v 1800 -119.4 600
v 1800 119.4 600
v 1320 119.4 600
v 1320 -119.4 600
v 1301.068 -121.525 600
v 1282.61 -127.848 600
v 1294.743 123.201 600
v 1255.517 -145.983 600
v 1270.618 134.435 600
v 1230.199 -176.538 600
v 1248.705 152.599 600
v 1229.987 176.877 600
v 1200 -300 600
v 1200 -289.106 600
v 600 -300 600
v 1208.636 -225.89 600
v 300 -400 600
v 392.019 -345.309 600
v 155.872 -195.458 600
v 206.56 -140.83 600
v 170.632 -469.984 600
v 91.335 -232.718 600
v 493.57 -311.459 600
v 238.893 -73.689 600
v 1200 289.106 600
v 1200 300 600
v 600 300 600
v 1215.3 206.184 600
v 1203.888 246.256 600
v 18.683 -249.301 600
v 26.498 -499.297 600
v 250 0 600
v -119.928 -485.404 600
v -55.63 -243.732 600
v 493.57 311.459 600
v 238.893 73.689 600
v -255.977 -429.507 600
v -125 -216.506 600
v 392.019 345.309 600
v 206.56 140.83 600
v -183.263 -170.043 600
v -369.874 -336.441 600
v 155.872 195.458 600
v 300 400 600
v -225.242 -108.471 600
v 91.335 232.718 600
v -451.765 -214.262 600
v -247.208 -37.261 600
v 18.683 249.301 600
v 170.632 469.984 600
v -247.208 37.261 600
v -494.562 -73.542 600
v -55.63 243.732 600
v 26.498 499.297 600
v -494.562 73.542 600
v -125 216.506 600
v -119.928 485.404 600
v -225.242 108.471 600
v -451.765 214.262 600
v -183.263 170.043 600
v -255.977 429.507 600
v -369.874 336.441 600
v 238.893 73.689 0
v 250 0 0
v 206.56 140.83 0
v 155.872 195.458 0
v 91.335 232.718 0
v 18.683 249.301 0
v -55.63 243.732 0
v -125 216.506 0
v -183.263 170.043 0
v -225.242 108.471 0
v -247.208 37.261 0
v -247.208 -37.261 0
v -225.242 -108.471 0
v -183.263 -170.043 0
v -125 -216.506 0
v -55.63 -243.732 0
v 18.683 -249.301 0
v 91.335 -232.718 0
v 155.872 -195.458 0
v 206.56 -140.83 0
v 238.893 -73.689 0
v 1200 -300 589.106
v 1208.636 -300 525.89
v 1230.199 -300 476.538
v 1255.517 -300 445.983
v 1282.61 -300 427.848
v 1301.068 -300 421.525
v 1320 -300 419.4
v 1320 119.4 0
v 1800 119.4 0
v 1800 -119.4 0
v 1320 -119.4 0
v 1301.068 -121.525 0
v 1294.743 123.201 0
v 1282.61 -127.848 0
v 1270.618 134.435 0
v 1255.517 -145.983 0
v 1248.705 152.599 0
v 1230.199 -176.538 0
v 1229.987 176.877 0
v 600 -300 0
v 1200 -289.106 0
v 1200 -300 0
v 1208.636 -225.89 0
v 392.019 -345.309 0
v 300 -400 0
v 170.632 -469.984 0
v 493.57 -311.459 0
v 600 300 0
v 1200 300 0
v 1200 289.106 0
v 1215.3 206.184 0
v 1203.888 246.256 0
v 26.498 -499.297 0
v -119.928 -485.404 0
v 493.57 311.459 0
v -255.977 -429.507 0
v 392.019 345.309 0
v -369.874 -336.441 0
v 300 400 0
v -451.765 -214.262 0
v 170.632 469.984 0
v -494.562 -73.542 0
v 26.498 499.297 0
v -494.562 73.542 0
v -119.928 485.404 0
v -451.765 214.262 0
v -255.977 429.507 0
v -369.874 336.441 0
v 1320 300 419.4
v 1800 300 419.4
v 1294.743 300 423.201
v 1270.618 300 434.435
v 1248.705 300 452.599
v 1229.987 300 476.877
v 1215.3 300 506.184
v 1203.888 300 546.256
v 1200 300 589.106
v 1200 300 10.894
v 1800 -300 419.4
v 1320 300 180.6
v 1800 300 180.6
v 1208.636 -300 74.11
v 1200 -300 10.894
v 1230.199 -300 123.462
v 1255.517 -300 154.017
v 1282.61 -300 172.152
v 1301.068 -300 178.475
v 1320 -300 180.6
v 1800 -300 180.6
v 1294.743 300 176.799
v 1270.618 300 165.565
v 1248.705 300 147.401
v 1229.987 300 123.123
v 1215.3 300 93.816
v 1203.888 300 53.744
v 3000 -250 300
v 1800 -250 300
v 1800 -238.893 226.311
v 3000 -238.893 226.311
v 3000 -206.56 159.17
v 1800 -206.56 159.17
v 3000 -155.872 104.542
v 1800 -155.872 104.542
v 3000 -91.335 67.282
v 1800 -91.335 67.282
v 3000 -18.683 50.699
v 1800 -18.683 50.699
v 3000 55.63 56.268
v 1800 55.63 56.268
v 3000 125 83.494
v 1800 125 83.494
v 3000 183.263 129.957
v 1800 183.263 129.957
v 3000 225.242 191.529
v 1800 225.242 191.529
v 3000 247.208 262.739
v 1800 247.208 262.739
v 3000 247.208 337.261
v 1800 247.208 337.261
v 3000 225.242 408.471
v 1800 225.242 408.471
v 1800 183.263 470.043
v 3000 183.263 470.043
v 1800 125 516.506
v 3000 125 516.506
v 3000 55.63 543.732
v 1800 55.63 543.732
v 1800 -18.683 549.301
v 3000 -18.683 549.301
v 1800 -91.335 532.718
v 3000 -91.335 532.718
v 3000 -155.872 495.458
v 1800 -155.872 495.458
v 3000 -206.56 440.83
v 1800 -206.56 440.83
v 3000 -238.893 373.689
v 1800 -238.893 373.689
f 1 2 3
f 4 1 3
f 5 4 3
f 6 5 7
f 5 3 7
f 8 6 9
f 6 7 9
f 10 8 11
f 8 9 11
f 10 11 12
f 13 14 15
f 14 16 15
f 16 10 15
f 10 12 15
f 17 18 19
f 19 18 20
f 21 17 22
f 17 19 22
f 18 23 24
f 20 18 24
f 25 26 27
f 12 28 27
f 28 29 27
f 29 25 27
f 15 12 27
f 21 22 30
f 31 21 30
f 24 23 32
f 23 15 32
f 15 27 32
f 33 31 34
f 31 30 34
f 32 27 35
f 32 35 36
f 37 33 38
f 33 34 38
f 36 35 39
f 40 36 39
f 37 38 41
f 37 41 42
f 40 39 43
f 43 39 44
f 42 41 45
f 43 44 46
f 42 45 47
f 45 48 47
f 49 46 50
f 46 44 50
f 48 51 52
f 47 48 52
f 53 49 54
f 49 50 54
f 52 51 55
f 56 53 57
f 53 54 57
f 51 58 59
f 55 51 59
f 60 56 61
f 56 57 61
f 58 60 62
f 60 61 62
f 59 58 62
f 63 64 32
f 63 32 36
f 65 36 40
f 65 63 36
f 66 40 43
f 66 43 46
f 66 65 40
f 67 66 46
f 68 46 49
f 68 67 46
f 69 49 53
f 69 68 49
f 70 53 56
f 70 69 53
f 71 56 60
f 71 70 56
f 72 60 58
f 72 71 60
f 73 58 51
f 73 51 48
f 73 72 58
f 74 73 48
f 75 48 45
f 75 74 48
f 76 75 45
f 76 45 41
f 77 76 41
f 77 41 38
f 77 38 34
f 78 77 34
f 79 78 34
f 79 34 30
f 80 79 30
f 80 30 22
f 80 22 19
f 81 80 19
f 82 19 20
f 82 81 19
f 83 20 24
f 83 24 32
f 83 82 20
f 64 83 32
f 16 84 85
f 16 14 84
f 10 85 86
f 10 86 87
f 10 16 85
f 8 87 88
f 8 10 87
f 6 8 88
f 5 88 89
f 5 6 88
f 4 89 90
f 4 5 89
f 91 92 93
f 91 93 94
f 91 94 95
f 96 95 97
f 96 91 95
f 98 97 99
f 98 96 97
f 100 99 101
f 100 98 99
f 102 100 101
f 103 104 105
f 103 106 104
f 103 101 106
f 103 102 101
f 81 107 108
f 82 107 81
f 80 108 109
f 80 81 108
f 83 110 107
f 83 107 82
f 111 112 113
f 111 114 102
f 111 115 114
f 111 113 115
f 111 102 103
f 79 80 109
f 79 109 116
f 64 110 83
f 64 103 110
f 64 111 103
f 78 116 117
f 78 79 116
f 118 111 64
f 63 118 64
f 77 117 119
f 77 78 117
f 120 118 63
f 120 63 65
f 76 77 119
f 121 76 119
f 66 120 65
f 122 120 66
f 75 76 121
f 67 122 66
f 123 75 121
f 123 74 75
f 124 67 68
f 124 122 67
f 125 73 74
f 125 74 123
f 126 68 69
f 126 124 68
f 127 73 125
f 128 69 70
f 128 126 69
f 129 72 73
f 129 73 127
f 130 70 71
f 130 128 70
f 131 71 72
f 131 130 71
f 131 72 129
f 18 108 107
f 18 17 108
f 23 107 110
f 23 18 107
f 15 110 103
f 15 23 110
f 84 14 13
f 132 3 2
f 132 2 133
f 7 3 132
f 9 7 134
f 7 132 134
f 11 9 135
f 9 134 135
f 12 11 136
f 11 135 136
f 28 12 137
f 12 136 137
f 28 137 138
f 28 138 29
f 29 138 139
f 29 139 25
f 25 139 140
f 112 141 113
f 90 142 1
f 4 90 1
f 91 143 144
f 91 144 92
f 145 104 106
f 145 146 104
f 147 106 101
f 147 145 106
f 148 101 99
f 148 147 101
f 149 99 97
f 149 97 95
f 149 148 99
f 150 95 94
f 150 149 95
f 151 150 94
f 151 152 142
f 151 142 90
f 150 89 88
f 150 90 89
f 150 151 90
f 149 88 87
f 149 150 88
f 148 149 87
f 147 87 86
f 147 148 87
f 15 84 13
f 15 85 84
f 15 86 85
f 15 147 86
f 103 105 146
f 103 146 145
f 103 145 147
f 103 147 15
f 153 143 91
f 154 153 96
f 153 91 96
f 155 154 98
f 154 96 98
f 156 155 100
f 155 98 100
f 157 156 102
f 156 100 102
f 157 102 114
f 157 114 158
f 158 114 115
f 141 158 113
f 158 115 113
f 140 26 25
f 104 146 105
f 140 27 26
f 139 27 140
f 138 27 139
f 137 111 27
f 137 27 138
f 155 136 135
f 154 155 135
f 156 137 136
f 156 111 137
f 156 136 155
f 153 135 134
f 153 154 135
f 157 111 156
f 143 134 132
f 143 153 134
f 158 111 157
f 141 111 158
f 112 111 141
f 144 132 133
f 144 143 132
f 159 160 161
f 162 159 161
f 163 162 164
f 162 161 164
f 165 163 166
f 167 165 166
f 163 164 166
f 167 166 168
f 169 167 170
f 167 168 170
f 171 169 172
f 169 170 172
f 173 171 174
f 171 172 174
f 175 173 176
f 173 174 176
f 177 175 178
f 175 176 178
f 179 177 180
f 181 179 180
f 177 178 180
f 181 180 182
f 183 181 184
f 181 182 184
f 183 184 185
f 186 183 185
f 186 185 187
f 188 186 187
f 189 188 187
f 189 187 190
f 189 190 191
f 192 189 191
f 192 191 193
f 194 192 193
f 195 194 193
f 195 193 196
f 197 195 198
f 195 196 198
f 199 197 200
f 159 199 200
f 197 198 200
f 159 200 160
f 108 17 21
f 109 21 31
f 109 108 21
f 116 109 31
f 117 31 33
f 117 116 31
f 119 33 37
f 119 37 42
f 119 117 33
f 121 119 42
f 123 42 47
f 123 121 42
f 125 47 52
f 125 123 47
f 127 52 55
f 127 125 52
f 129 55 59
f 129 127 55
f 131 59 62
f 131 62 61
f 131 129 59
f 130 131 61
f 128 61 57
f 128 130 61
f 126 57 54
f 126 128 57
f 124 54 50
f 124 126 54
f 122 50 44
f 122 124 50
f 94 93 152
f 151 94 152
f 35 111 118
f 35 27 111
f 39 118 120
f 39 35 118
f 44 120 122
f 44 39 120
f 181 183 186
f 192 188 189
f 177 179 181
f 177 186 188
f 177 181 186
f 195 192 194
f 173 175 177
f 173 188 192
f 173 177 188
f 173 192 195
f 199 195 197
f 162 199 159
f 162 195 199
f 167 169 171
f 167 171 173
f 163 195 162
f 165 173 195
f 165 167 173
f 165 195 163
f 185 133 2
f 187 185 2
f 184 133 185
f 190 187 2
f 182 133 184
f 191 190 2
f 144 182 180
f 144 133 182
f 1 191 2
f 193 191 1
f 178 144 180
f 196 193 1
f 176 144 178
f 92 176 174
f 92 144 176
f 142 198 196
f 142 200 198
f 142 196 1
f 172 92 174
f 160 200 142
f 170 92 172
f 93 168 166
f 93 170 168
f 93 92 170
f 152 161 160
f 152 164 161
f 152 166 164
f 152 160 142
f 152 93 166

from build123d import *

# Parameters (mm, degrees)
SKETCH1_R           = 250
BOSS_EXTRUDE1_DEPTH = 600
FILLET1_R           = 500
FILLET2_R           = 500
CUT_EXTRUDE2_DEPTH  = 600
SKETCH2_4_R         = 250
BOSS_EXTRUDE2_DEPTH = 1200
FILLET3_R           = 120


with BuildPart() as part:
    # Sketch1 → Boss-Extrude1 (new body)
    with BuildSketch(Plane.XY):
        with BuildLine():
            Line((400, 300), (1800, 300))
            Line((1800, 300), (1800, -300))
            Line((1800, -300), (400, -300))
            ThreePointArc((400, -300), (-500, 0), (400, 300))
        make_face()
        Circle(SKETCH1_R, mode=Mode.SUBTRACT)
    extrude(amount=BOSS_EXTRUDE1_DEPTH)

    # Fillet1
    fillet1_edges = [part.edges().sort_by_distance(p)[0] for p in [
        (400, 300, 300),
    ]]
    fillet(fillet1_edges, radius=FILLET1_R)

    # Fillet2
    fillet2_edges = [part.edges().sort_by_distance(p)[0] for p in [
        (400, -300, 300),
    ]]
    fillet(fillet2_edges, radius=FILLET2_R)

    # Sketch2 → Cut-Extrude2 (cut)
    with BuildSketch(Plane(origin=(1800, 0, 0), x_dir=(0, 0, -1), z_dir=(1, 0, 0))):
        Polygon((0, 119.4), (0, 300), (-180.6, 300), align=None)
        Polygon((-600, 119.4), (-419.4, 300), (-600, 300), align=None)
        Polygon((0, -300), (0, -119.4), (-180.6, -300), align=None)
        Polygon((-419.4, -300), (-600, -119.4), (-600, -300), align=None)
    extrude(amount=-CUT_EXTRUDE2_DEPTH, mode=Mode.SUBTRACT)

    # Sketch2<4> → Boss-Extrude2 (add)
    with BuildSketch(Plane(origin=(1800, 0, 0), x_dir=(0, 0, -1), z_dir=(1, 0, 0))):
        with Locations((-300, 0)):
            Circle(SKETCH2_4_R)
    extrude(amount=BOSS_EXTRUDE2_DEPTH)

    # Fillet3
    fillet3_edges = [part.edges().sort_by_distance(p)[0] for p in [
        (1200, -209.7, 509.7),
        (1200, -209.7, 90.3),
        (1200, 209.7, 90.3),
        (1200, 209.7, 509.7),
    ]]
    fillet(fillet3_edges, radius=FILLET3_R)


solid = part.part
